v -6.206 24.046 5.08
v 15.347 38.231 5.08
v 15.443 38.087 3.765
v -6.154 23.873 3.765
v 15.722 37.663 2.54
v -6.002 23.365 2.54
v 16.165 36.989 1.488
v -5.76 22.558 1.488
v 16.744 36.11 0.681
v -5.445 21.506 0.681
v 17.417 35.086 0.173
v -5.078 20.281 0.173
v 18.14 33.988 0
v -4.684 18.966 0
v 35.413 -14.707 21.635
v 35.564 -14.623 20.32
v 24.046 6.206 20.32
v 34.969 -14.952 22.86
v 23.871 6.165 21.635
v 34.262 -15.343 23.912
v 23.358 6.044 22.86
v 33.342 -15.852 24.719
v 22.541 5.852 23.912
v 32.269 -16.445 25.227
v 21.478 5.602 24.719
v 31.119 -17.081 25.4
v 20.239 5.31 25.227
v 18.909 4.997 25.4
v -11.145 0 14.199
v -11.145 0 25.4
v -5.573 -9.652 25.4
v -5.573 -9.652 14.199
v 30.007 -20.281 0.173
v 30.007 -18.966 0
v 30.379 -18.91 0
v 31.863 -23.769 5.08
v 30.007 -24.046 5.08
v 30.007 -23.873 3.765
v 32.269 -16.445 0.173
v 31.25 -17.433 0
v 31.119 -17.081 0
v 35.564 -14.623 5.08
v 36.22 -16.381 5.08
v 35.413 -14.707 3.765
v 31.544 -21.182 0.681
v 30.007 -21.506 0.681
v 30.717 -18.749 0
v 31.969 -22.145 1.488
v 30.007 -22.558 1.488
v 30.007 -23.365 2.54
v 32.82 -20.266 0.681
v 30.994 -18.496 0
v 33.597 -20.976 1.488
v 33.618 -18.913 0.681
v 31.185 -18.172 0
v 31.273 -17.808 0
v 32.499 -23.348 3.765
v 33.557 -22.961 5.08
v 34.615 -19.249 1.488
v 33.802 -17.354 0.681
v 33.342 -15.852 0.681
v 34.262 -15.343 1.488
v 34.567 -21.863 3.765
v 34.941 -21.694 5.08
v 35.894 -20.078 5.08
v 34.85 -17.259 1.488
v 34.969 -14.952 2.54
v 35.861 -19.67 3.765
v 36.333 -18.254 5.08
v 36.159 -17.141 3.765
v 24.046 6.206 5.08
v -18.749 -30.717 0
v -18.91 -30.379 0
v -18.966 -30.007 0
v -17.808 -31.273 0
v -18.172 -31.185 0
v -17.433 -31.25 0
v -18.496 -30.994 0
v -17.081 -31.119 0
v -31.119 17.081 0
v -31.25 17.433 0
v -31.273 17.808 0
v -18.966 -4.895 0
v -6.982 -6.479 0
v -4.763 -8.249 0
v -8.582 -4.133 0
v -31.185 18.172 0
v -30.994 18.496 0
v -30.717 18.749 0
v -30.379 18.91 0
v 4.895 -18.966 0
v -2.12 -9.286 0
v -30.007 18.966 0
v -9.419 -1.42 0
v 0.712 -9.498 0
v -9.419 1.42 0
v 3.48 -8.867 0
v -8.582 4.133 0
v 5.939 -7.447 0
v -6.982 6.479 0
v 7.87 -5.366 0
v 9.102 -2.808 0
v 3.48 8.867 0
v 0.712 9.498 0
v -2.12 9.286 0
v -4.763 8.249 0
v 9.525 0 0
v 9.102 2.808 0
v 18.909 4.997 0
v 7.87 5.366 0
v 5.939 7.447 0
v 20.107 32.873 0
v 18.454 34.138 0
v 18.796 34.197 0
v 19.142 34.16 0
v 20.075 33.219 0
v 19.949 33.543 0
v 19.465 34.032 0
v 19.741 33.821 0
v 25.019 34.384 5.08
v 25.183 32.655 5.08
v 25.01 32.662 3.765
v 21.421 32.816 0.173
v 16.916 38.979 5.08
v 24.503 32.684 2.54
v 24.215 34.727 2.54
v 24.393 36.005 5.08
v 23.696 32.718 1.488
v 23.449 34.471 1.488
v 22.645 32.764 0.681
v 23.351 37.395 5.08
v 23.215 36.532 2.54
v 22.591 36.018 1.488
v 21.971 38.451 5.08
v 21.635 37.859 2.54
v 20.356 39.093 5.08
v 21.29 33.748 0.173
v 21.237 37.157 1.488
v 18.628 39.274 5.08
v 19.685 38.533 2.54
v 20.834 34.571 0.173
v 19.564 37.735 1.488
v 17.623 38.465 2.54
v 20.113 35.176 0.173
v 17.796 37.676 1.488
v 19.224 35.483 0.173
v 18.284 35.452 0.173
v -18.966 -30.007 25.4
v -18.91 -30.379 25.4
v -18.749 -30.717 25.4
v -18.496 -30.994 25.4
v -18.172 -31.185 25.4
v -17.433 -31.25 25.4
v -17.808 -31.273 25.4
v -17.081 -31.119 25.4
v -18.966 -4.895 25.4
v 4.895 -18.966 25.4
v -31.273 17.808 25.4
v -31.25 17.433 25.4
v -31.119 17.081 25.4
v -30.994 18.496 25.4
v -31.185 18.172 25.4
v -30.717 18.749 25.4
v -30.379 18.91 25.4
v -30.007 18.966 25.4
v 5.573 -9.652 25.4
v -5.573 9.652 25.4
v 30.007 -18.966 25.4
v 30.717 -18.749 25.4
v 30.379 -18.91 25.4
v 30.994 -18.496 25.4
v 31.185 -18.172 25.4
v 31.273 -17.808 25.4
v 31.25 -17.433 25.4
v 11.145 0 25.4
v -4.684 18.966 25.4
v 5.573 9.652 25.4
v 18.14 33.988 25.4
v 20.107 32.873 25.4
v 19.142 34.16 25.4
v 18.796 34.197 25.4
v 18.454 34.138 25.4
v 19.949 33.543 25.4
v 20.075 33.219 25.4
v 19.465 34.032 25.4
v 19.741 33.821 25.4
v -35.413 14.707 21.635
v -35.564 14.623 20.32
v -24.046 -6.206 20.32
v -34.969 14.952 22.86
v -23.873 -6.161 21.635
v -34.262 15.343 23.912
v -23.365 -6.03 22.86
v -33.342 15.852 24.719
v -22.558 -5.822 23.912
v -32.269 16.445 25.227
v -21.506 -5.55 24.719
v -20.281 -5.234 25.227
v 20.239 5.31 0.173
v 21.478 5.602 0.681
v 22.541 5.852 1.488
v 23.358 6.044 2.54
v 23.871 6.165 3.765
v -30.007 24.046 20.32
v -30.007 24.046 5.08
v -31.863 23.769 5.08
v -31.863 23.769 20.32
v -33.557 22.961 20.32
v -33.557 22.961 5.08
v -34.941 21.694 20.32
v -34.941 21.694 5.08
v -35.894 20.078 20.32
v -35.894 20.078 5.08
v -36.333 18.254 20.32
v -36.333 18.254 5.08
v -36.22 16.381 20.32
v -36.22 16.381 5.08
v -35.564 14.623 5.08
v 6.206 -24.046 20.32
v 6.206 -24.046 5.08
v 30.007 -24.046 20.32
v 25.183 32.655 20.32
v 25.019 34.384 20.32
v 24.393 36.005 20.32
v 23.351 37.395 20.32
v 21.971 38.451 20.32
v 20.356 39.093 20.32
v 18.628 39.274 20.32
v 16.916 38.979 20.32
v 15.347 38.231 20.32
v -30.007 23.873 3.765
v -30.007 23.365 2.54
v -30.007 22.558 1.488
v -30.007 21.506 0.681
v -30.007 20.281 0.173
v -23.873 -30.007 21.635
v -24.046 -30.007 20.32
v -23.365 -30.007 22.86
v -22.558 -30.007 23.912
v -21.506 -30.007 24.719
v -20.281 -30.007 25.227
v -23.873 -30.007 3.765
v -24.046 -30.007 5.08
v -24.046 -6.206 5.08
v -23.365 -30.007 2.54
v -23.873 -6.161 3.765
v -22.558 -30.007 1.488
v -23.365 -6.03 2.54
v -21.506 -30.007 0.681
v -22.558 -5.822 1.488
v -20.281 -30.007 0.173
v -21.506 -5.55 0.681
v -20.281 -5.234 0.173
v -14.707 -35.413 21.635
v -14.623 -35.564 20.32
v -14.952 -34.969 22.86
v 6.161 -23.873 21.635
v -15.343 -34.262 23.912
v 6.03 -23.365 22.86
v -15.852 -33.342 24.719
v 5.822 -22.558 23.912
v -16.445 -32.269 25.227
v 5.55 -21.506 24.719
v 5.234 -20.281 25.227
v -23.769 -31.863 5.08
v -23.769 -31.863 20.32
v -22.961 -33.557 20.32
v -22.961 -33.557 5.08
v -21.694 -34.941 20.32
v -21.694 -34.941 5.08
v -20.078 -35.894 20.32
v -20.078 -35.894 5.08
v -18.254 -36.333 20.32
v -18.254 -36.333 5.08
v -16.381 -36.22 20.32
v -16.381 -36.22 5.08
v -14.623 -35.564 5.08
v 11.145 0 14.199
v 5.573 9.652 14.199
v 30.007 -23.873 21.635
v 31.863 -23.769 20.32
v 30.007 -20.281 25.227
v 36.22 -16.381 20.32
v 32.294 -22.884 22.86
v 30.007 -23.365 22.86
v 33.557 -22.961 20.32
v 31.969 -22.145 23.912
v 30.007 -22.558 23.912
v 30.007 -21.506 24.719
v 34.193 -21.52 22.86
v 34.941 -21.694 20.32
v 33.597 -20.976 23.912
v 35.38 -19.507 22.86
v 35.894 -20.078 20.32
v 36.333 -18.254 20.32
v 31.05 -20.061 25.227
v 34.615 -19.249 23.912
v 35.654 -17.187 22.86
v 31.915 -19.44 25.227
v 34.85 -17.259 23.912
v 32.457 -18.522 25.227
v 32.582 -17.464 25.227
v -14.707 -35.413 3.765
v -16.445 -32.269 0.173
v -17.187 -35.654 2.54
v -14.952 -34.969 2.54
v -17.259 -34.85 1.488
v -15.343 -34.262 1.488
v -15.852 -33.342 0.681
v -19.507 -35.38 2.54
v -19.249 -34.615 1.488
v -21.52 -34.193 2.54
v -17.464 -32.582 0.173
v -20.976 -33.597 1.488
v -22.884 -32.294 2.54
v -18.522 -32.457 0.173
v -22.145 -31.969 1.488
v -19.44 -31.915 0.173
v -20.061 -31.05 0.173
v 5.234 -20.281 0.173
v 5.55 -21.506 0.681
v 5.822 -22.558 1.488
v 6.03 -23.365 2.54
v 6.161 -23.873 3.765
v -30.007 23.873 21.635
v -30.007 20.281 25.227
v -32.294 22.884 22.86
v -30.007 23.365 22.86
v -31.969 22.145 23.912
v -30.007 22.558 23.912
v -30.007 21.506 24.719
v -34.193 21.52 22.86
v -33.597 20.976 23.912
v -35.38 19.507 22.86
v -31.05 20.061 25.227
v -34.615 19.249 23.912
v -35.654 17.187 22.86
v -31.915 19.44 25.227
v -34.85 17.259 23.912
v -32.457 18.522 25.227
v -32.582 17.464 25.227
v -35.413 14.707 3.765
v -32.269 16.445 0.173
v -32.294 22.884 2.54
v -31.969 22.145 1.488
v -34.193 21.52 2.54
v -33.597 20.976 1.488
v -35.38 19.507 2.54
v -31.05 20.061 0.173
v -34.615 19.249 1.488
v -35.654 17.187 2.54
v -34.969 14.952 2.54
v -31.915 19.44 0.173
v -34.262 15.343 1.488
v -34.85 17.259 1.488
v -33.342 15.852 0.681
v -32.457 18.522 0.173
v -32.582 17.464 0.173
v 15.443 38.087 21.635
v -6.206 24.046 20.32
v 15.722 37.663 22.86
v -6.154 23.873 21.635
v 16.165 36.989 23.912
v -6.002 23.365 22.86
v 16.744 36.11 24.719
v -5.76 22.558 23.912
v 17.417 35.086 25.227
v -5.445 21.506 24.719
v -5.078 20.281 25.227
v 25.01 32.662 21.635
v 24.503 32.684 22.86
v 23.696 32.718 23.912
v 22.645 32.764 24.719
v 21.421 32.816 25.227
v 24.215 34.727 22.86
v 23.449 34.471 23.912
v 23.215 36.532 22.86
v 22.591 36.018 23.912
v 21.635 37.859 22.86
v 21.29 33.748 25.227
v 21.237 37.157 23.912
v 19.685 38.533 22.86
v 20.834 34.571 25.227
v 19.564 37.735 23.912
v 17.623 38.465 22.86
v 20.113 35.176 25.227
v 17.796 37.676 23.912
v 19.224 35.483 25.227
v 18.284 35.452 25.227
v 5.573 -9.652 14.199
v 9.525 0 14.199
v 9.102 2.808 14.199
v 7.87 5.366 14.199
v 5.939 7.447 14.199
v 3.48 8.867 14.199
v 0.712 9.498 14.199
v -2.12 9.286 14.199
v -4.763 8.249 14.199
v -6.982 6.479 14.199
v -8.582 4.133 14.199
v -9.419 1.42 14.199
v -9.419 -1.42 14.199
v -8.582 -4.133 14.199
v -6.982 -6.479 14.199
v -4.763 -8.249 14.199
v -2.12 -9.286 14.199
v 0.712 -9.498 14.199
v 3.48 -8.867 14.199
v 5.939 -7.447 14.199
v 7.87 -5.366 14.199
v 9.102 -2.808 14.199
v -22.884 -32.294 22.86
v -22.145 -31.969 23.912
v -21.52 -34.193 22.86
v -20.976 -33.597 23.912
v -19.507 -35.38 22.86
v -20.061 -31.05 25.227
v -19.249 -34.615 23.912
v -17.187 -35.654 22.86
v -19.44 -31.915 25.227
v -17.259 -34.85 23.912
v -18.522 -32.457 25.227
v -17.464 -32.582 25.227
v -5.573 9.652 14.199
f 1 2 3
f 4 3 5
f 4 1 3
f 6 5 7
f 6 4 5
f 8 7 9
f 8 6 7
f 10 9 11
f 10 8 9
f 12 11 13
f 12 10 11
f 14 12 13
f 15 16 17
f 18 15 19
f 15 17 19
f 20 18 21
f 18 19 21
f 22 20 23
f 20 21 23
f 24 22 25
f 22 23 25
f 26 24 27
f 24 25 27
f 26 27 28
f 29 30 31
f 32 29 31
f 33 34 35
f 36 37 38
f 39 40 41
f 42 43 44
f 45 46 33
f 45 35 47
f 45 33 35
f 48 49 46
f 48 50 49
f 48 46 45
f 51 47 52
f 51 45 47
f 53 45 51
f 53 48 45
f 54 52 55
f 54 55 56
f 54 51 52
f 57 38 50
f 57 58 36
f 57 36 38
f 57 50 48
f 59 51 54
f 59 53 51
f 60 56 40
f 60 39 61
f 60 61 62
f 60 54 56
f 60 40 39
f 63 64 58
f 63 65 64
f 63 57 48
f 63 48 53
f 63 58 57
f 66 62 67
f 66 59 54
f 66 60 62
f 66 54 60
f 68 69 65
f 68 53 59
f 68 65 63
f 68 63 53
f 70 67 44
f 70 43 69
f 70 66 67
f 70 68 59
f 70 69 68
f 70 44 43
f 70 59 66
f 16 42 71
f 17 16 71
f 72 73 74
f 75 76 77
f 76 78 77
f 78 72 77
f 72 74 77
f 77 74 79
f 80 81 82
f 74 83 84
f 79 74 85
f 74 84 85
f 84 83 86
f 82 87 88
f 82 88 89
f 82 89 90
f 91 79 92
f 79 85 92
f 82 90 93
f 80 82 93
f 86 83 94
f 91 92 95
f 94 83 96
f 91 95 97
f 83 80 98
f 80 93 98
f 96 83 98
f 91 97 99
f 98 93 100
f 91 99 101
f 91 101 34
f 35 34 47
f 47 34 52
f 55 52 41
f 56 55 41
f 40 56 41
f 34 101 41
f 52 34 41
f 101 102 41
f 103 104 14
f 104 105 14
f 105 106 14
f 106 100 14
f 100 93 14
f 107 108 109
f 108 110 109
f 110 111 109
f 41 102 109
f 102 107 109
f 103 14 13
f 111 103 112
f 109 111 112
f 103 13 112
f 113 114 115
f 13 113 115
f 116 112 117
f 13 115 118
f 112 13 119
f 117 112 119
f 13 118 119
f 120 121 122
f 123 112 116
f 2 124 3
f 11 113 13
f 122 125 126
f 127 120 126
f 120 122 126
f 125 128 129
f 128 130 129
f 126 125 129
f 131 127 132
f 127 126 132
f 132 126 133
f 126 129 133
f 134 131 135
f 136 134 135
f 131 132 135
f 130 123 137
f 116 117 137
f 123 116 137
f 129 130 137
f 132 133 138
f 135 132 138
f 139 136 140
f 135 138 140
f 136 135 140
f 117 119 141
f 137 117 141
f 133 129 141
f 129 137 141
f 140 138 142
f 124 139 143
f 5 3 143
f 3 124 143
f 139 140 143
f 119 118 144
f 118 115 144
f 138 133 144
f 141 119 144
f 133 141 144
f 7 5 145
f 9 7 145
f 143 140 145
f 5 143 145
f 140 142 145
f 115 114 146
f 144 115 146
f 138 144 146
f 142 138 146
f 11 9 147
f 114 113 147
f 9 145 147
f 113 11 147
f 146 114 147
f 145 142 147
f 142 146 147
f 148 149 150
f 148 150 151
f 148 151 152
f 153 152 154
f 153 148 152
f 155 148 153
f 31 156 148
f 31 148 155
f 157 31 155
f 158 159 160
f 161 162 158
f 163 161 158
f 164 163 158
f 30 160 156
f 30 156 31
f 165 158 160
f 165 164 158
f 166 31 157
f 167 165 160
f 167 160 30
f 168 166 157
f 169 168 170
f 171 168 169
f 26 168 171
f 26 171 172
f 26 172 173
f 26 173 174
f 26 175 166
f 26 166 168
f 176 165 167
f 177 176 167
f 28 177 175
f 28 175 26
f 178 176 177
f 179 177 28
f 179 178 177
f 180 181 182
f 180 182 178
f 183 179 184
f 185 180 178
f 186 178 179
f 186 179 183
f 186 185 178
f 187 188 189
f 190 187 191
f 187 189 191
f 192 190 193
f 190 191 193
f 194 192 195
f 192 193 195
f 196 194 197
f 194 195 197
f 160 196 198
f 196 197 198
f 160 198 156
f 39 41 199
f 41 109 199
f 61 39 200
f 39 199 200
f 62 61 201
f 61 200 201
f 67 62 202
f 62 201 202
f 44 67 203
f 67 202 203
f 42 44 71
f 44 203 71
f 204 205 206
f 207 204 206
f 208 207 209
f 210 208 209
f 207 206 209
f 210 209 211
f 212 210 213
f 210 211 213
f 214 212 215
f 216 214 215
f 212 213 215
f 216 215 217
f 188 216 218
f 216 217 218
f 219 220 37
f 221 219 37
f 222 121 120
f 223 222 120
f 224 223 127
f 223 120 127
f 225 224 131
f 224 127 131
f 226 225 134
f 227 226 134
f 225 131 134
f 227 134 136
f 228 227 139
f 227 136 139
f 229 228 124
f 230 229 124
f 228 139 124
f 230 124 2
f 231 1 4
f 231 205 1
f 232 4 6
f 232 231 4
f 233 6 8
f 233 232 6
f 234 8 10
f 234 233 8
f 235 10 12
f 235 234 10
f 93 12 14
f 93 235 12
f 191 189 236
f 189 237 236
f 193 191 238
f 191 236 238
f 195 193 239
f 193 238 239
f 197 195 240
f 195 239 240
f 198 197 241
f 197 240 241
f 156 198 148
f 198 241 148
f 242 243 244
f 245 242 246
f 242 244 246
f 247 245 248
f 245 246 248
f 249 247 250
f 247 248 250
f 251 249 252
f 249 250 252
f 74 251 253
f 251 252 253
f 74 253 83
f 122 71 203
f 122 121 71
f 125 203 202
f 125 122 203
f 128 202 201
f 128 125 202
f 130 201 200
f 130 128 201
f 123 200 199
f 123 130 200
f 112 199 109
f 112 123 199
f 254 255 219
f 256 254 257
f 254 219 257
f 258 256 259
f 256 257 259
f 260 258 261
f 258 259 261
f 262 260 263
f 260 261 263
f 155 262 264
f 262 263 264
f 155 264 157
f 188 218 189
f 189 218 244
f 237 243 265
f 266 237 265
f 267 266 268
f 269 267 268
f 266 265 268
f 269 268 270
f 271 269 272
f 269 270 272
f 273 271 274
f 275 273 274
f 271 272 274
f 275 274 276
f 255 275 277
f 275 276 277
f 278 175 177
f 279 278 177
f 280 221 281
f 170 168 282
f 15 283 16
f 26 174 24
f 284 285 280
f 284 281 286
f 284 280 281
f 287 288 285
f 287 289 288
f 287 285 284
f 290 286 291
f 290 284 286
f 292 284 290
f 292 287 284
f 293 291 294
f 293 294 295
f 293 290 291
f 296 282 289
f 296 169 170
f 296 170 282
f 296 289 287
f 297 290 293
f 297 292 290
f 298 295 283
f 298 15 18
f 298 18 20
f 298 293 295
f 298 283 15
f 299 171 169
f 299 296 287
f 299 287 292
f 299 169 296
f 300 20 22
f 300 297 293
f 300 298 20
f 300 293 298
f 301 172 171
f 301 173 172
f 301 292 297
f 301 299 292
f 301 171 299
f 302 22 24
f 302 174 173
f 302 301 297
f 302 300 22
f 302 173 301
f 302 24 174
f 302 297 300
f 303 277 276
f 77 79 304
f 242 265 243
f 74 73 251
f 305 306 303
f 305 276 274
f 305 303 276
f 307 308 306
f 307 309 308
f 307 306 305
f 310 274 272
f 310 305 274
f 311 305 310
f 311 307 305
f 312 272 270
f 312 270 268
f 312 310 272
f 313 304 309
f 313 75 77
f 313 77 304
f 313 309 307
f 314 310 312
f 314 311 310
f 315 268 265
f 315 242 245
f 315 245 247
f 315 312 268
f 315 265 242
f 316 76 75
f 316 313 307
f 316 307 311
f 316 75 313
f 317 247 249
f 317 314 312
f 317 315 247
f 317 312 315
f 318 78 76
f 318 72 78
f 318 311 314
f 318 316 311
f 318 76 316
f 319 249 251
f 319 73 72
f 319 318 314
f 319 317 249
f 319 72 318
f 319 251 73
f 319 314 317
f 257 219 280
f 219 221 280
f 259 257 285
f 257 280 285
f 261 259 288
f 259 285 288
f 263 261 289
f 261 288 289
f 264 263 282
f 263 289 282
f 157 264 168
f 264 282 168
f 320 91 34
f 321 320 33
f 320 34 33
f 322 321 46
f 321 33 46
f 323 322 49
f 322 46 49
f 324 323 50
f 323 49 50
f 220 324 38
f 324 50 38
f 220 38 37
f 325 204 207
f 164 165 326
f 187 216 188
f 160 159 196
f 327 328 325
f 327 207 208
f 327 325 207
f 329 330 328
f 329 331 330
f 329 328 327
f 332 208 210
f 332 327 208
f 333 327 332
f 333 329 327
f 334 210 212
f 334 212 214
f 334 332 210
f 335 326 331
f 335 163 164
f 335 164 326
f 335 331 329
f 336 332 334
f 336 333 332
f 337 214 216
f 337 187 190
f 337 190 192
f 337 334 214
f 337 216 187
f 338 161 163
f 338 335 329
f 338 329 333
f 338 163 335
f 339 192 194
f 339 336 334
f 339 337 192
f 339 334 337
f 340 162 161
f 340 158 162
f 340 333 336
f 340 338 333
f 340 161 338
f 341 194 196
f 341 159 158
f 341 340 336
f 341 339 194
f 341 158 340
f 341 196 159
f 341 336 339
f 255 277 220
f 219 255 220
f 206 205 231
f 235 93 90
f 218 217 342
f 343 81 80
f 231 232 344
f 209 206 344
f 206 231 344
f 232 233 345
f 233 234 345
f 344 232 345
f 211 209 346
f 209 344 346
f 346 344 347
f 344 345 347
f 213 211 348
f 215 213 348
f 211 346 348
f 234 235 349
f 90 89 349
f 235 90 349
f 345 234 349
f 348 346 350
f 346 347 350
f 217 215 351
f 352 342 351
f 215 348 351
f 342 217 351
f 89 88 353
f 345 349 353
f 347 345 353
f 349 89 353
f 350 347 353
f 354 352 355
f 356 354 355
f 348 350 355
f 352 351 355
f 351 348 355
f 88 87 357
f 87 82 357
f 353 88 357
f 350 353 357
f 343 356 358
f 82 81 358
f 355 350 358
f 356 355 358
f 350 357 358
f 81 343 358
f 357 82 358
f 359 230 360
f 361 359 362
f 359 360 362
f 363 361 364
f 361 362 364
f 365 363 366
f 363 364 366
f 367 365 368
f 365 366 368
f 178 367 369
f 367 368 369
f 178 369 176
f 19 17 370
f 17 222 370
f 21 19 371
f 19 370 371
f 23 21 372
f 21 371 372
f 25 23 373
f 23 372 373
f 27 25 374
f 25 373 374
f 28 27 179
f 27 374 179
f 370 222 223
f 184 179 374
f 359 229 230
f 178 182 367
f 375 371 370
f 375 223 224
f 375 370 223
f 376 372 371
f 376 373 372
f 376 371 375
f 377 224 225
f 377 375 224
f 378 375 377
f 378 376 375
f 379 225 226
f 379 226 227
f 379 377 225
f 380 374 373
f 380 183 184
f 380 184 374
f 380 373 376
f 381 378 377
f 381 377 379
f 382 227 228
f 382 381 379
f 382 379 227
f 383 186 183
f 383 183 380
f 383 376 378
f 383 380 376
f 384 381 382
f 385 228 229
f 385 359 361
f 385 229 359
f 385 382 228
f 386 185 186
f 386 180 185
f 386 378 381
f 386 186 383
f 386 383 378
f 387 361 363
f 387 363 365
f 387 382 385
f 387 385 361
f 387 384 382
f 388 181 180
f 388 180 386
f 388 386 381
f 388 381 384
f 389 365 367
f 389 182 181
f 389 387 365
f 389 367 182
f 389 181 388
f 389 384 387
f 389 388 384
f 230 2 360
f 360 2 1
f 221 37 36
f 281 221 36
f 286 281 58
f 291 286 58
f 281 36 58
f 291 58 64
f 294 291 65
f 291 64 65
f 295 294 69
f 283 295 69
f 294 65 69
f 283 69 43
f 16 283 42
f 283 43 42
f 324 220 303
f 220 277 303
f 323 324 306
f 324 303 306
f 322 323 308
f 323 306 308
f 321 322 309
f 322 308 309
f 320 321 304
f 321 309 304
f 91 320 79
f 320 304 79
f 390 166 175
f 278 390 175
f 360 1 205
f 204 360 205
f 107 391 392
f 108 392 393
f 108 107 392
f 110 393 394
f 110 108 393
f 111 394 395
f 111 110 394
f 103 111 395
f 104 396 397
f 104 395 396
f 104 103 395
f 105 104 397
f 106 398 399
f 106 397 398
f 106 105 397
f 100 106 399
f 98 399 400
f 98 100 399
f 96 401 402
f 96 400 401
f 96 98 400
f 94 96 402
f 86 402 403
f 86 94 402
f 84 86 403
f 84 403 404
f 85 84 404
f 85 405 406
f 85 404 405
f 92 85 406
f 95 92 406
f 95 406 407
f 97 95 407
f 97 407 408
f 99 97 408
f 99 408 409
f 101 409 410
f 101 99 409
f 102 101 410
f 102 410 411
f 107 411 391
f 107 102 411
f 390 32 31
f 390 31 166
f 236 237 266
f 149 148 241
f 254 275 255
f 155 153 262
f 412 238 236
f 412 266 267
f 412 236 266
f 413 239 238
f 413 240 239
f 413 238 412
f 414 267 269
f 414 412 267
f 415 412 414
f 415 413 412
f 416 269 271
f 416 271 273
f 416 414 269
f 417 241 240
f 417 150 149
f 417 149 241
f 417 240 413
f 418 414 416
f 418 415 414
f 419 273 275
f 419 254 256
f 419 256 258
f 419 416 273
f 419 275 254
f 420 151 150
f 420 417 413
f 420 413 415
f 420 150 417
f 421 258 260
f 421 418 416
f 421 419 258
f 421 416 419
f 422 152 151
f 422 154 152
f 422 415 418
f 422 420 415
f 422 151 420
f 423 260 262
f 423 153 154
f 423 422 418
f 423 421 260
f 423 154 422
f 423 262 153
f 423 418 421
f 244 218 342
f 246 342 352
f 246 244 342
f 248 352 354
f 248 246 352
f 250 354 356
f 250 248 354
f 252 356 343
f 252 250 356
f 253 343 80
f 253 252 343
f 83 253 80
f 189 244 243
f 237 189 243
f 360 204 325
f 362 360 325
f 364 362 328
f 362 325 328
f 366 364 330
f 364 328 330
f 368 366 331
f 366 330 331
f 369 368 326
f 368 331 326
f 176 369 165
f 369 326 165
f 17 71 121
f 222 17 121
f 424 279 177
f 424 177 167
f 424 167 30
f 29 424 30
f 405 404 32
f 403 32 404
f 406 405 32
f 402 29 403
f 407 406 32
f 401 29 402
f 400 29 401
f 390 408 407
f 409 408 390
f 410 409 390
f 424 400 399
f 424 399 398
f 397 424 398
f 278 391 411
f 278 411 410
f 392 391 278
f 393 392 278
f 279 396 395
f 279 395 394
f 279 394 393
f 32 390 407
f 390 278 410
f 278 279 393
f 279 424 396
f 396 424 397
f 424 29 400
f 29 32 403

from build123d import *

# Parameters (mm, degrees)
F0_R     = 9.525
F1_DEPTH = 25.4
F2_R     = 5.08
F3_R     = 5.08
F5_DEPTH = 11.2014


with BuildPart() as f1:
    # F0 (on Top) → F1 (new body)
    with BuildSketch(Plane.XY):
        with BuildLine():
            Line((15.347393, 38.231497), (-6.205886, 24.045919))
            Line((-6.205886, 24.045919), (-30.007427, 24.045919))
            ThreePointArc((-30.007427, 24.045919), (-35.477162, 20.92152), (-35.564335, 14.622928))
            Line((-35.564335, 14.622928), (-24.045919, -6.205886))
            Line((-24.045919, -6.205886), (-24.045919, -30.007427))
            ThreePointArc((-24.045919, -30.007427), (-20.92152, -35.477162), (-14.622928, -35.564335))
            Line((-14.622928, -35.564335), (6.205886, -24.045919))
            Line((6.205886, -24.045919), (30.007427, -24.045919))
            ThreePointArc((30.007427, -24.045919), (35.477162, -20.92152), (35.564335, -14.622928))
            Line((35.564335, -14.622928), (24.045919, 6.205886))
            Line((24.045919, 6.205886), (25.182596, 32.654602))
            ThreePointArc((25.182596, 32.654602), (21.970617, 38.451023), (15.347393, 38.231497))
        make_face()
        Circle(F0_R, mode=Mode.SUBTRACT)
    extrude(amount=F1_DEPTH)

    # F2
    f2_edges = [f1.edges().sort_by_distance(p)[0] for p in [
        (-29.805127, 4.208521, 0),
        (4.570753, 31.138708, 0),
    ]]
    fillet(f2_edges, radius=F2_R)

    # F3
    f3_edges = [f1.edges().sort_by_distance(p)[0] for p in [
        (-24.045919, -18.106656, 0),
        (4.570753, 31.138708, 25.4),
        (-18.106656, 24.045919, 25.4),
        (-24.045919, -18.106656, 25.4),
        (18.106656, -24.045919, 25.4),
        (18.106656, -24.045919, 0),
    ]]
    fillet(f3_edges, radius=F3_R)

    # F4 (on face) → F5 (cut)
    with BuildSketch(Plane.XY.offset(25.4)):
        Polygon((-5.572585, -9.652), (5.572585, -9.652), (11.14517, 0), (5.572585, 9.652), (-5.572585, 9.652), (-11.14517, 0), align=None)
    extrude(amount=-F5_DEPTH, mode=Mode.SUBTRACT)


solid = f1.part
